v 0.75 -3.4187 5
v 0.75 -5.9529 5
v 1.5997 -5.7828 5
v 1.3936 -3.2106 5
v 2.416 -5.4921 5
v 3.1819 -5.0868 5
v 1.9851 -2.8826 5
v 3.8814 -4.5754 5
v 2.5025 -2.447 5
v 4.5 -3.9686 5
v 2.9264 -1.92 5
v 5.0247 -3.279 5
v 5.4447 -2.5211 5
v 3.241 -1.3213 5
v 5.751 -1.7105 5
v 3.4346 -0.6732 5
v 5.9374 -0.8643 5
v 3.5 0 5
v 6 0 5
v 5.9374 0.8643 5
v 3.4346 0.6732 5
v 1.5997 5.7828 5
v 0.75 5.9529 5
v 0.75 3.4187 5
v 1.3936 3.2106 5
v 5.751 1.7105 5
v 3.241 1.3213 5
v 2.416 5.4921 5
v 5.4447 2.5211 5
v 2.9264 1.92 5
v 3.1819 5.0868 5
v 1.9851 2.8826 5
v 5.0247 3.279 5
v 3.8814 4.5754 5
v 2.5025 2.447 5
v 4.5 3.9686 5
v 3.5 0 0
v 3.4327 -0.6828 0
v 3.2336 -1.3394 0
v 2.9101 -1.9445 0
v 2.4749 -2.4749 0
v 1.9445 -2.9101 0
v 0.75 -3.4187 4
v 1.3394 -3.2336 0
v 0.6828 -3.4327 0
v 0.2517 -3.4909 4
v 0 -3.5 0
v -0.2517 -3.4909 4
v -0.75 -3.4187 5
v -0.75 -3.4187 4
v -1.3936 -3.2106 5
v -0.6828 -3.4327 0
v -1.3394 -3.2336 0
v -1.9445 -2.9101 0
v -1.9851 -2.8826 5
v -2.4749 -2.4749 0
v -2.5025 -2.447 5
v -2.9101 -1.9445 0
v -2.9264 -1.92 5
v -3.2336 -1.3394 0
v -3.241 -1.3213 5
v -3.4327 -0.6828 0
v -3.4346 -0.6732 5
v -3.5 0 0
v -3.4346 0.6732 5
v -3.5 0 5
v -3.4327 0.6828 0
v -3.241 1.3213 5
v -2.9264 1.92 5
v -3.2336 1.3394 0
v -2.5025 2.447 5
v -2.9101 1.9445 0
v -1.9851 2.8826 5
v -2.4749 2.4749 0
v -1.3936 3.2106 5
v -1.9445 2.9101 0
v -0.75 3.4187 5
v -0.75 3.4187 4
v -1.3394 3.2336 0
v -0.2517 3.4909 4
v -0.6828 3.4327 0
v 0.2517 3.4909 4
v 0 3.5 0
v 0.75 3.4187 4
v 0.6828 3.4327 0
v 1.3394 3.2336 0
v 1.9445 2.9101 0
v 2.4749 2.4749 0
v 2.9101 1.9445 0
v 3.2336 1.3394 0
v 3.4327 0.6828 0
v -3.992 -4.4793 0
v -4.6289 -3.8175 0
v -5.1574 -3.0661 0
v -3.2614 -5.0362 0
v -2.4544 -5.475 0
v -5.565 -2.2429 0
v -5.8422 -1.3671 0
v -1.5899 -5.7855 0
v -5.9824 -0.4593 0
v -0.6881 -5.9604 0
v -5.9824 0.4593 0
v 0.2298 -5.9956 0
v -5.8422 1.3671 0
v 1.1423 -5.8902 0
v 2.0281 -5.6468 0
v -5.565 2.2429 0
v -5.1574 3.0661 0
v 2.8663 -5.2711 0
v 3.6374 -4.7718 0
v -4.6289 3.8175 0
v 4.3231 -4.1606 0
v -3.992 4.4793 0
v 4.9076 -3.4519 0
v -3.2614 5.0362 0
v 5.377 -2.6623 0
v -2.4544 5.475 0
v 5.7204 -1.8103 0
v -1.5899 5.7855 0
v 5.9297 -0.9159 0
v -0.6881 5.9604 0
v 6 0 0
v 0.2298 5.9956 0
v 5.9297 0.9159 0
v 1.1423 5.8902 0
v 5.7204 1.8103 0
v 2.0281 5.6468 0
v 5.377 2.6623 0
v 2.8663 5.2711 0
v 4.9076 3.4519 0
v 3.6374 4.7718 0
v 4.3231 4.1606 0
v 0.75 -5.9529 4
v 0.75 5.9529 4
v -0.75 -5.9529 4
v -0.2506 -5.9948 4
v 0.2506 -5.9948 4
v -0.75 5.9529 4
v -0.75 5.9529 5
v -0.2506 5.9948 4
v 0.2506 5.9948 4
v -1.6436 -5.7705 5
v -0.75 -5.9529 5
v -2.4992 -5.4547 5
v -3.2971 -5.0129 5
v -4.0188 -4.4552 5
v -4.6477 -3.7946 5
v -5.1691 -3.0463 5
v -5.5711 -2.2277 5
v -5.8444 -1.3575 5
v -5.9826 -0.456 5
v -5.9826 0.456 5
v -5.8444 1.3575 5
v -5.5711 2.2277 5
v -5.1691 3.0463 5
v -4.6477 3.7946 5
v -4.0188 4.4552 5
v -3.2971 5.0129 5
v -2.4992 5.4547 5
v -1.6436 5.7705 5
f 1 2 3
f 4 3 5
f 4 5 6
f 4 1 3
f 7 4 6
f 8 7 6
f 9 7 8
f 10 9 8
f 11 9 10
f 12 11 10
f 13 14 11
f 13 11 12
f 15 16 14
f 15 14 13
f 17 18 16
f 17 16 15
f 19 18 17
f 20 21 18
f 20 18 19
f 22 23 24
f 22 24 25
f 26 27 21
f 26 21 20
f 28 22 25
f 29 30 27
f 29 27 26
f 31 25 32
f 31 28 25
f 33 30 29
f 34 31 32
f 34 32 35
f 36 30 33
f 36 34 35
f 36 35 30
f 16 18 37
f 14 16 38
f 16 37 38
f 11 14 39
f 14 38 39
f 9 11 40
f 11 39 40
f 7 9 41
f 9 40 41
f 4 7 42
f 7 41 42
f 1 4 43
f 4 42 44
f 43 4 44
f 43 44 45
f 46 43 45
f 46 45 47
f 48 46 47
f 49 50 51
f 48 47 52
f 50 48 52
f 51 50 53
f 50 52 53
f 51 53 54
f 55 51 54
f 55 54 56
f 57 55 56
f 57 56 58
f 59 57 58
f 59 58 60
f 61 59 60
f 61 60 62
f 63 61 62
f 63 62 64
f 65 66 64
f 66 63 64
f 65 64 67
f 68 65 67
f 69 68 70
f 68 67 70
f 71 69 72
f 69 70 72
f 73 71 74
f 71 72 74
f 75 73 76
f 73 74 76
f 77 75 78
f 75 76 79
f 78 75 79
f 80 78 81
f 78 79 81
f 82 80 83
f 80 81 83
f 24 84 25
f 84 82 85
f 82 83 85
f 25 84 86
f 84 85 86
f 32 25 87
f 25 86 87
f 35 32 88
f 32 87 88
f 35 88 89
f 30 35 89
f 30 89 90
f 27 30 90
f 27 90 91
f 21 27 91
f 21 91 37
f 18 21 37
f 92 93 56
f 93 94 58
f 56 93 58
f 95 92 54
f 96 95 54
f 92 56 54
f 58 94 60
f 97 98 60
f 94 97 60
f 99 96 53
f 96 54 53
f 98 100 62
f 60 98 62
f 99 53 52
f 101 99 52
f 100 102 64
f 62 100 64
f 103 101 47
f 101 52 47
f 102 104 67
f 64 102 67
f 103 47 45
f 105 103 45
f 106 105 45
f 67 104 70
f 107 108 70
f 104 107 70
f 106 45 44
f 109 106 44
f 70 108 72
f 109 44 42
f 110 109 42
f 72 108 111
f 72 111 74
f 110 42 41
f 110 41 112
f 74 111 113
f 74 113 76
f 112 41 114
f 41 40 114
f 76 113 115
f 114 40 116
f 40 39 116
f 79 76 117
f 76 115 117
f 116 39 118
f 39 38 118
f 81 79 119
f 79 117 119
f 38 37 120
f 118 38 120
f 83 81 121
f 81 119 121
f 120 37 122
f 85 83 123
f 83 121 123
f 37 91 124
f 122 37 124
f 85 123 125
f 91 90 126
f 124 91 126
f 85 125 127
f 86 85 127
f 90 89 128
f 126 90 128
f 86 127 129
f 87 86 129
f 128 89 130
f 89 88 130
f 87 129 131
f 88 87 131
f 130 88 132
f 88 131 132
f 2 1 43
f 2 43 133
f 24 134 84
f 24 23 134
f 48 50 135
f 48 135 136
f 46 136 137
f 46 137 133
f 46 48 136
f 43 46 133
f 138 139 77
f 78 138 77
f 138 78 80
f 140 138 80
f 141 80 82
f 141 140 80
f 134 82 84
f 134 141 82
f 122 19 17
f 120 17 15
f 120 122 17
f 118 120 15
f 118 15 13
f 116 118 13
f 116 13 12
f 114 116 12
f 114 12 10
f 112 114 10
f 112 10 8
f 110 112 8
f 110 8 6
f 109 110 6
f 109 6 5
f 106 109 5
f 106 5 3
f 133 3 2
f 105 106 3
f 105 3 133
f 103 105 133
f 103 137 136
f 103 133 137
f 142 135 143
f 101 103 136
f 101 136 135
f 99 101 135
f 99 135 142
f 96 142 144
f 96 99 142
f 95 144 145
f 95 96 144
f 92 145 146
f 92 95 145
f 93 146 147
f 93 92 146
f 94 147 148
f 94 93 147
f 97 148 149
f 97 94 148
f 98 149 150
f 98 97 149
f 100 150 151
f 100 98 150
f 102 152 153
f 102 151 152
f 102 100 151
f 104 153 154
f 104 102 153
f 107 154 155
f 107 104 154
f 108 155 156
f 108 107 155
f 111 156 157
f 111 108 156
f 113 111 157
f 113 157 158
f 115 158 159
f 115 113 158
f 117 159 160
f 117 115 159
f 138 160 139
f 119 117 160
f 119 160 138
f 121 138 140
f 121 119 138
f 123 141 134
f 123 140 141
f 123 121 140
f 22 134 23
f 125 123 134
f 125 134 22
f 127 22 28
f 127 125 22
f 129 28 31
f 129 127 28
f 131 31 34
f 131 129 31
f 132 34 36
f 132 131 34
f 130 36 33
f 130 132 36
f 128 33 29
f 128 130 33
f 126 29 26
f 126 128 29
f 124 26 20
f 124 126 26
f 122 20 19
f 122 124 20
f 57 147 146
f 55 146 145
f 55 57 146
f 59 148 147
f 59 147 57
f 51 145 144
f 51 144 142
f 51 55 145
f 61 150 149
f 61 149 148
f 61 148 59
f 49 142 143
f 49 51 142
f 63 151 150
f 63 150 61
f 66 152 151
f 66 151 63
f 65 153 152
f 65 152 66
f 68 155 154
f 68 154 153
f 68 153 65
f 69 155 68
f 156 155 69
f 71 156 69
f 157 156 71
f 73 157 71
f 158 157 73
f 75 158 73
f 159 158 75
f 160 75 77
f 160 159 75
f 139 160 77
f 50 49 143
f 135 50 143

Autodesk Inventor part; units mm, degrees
ref_plane "YZ Plane" through (0, 0, 0) normal (1, 0, 0) x (0, 1, 0)
ref_plane "XZ Plane" through (0, 0, 0) normal (0, 1, 0) x (-1, 0, 0)
ref_plane "XY Plane" through (0, 0, 0) normal (0, 0, 1) x (1, 0, 0)
sketch "Sketch1" plane through (0, 0, 0) normal (0, 0, 1) x (1, 0, 0)
  circle A0 centre (0, 0) radius 6
  circle A1 centre (0, 0) radius 3.5
  dimension "d0" = 12
  dimension "d1" = 7
extrude "Extrusion1" add sketch "Sketch1" along normal blind 5
thread "Thread1" size "M12x1.75" class "6g" standard "ISO Metric profile" length 10
sketch "Sketch2" plane through (0, 0, 5) normal (0, 0, 1) x (1, 0, 0)
  circle A0 centre (0, 0) radius 6 projected
  line L0 (-0.75, 5.9529) -> (-0.75, -5.9529)
  line L1 (0.75, 5.9529) -> (0.75, -5.9529)
  line L2 (0, 0) -> (0, 6) construction
  dimension "d6" = 1.5
extrude "Extrusion2" cut sketch "Sketch2" against normal blind 1 contours L1 A0 L0
properties part number "37"
